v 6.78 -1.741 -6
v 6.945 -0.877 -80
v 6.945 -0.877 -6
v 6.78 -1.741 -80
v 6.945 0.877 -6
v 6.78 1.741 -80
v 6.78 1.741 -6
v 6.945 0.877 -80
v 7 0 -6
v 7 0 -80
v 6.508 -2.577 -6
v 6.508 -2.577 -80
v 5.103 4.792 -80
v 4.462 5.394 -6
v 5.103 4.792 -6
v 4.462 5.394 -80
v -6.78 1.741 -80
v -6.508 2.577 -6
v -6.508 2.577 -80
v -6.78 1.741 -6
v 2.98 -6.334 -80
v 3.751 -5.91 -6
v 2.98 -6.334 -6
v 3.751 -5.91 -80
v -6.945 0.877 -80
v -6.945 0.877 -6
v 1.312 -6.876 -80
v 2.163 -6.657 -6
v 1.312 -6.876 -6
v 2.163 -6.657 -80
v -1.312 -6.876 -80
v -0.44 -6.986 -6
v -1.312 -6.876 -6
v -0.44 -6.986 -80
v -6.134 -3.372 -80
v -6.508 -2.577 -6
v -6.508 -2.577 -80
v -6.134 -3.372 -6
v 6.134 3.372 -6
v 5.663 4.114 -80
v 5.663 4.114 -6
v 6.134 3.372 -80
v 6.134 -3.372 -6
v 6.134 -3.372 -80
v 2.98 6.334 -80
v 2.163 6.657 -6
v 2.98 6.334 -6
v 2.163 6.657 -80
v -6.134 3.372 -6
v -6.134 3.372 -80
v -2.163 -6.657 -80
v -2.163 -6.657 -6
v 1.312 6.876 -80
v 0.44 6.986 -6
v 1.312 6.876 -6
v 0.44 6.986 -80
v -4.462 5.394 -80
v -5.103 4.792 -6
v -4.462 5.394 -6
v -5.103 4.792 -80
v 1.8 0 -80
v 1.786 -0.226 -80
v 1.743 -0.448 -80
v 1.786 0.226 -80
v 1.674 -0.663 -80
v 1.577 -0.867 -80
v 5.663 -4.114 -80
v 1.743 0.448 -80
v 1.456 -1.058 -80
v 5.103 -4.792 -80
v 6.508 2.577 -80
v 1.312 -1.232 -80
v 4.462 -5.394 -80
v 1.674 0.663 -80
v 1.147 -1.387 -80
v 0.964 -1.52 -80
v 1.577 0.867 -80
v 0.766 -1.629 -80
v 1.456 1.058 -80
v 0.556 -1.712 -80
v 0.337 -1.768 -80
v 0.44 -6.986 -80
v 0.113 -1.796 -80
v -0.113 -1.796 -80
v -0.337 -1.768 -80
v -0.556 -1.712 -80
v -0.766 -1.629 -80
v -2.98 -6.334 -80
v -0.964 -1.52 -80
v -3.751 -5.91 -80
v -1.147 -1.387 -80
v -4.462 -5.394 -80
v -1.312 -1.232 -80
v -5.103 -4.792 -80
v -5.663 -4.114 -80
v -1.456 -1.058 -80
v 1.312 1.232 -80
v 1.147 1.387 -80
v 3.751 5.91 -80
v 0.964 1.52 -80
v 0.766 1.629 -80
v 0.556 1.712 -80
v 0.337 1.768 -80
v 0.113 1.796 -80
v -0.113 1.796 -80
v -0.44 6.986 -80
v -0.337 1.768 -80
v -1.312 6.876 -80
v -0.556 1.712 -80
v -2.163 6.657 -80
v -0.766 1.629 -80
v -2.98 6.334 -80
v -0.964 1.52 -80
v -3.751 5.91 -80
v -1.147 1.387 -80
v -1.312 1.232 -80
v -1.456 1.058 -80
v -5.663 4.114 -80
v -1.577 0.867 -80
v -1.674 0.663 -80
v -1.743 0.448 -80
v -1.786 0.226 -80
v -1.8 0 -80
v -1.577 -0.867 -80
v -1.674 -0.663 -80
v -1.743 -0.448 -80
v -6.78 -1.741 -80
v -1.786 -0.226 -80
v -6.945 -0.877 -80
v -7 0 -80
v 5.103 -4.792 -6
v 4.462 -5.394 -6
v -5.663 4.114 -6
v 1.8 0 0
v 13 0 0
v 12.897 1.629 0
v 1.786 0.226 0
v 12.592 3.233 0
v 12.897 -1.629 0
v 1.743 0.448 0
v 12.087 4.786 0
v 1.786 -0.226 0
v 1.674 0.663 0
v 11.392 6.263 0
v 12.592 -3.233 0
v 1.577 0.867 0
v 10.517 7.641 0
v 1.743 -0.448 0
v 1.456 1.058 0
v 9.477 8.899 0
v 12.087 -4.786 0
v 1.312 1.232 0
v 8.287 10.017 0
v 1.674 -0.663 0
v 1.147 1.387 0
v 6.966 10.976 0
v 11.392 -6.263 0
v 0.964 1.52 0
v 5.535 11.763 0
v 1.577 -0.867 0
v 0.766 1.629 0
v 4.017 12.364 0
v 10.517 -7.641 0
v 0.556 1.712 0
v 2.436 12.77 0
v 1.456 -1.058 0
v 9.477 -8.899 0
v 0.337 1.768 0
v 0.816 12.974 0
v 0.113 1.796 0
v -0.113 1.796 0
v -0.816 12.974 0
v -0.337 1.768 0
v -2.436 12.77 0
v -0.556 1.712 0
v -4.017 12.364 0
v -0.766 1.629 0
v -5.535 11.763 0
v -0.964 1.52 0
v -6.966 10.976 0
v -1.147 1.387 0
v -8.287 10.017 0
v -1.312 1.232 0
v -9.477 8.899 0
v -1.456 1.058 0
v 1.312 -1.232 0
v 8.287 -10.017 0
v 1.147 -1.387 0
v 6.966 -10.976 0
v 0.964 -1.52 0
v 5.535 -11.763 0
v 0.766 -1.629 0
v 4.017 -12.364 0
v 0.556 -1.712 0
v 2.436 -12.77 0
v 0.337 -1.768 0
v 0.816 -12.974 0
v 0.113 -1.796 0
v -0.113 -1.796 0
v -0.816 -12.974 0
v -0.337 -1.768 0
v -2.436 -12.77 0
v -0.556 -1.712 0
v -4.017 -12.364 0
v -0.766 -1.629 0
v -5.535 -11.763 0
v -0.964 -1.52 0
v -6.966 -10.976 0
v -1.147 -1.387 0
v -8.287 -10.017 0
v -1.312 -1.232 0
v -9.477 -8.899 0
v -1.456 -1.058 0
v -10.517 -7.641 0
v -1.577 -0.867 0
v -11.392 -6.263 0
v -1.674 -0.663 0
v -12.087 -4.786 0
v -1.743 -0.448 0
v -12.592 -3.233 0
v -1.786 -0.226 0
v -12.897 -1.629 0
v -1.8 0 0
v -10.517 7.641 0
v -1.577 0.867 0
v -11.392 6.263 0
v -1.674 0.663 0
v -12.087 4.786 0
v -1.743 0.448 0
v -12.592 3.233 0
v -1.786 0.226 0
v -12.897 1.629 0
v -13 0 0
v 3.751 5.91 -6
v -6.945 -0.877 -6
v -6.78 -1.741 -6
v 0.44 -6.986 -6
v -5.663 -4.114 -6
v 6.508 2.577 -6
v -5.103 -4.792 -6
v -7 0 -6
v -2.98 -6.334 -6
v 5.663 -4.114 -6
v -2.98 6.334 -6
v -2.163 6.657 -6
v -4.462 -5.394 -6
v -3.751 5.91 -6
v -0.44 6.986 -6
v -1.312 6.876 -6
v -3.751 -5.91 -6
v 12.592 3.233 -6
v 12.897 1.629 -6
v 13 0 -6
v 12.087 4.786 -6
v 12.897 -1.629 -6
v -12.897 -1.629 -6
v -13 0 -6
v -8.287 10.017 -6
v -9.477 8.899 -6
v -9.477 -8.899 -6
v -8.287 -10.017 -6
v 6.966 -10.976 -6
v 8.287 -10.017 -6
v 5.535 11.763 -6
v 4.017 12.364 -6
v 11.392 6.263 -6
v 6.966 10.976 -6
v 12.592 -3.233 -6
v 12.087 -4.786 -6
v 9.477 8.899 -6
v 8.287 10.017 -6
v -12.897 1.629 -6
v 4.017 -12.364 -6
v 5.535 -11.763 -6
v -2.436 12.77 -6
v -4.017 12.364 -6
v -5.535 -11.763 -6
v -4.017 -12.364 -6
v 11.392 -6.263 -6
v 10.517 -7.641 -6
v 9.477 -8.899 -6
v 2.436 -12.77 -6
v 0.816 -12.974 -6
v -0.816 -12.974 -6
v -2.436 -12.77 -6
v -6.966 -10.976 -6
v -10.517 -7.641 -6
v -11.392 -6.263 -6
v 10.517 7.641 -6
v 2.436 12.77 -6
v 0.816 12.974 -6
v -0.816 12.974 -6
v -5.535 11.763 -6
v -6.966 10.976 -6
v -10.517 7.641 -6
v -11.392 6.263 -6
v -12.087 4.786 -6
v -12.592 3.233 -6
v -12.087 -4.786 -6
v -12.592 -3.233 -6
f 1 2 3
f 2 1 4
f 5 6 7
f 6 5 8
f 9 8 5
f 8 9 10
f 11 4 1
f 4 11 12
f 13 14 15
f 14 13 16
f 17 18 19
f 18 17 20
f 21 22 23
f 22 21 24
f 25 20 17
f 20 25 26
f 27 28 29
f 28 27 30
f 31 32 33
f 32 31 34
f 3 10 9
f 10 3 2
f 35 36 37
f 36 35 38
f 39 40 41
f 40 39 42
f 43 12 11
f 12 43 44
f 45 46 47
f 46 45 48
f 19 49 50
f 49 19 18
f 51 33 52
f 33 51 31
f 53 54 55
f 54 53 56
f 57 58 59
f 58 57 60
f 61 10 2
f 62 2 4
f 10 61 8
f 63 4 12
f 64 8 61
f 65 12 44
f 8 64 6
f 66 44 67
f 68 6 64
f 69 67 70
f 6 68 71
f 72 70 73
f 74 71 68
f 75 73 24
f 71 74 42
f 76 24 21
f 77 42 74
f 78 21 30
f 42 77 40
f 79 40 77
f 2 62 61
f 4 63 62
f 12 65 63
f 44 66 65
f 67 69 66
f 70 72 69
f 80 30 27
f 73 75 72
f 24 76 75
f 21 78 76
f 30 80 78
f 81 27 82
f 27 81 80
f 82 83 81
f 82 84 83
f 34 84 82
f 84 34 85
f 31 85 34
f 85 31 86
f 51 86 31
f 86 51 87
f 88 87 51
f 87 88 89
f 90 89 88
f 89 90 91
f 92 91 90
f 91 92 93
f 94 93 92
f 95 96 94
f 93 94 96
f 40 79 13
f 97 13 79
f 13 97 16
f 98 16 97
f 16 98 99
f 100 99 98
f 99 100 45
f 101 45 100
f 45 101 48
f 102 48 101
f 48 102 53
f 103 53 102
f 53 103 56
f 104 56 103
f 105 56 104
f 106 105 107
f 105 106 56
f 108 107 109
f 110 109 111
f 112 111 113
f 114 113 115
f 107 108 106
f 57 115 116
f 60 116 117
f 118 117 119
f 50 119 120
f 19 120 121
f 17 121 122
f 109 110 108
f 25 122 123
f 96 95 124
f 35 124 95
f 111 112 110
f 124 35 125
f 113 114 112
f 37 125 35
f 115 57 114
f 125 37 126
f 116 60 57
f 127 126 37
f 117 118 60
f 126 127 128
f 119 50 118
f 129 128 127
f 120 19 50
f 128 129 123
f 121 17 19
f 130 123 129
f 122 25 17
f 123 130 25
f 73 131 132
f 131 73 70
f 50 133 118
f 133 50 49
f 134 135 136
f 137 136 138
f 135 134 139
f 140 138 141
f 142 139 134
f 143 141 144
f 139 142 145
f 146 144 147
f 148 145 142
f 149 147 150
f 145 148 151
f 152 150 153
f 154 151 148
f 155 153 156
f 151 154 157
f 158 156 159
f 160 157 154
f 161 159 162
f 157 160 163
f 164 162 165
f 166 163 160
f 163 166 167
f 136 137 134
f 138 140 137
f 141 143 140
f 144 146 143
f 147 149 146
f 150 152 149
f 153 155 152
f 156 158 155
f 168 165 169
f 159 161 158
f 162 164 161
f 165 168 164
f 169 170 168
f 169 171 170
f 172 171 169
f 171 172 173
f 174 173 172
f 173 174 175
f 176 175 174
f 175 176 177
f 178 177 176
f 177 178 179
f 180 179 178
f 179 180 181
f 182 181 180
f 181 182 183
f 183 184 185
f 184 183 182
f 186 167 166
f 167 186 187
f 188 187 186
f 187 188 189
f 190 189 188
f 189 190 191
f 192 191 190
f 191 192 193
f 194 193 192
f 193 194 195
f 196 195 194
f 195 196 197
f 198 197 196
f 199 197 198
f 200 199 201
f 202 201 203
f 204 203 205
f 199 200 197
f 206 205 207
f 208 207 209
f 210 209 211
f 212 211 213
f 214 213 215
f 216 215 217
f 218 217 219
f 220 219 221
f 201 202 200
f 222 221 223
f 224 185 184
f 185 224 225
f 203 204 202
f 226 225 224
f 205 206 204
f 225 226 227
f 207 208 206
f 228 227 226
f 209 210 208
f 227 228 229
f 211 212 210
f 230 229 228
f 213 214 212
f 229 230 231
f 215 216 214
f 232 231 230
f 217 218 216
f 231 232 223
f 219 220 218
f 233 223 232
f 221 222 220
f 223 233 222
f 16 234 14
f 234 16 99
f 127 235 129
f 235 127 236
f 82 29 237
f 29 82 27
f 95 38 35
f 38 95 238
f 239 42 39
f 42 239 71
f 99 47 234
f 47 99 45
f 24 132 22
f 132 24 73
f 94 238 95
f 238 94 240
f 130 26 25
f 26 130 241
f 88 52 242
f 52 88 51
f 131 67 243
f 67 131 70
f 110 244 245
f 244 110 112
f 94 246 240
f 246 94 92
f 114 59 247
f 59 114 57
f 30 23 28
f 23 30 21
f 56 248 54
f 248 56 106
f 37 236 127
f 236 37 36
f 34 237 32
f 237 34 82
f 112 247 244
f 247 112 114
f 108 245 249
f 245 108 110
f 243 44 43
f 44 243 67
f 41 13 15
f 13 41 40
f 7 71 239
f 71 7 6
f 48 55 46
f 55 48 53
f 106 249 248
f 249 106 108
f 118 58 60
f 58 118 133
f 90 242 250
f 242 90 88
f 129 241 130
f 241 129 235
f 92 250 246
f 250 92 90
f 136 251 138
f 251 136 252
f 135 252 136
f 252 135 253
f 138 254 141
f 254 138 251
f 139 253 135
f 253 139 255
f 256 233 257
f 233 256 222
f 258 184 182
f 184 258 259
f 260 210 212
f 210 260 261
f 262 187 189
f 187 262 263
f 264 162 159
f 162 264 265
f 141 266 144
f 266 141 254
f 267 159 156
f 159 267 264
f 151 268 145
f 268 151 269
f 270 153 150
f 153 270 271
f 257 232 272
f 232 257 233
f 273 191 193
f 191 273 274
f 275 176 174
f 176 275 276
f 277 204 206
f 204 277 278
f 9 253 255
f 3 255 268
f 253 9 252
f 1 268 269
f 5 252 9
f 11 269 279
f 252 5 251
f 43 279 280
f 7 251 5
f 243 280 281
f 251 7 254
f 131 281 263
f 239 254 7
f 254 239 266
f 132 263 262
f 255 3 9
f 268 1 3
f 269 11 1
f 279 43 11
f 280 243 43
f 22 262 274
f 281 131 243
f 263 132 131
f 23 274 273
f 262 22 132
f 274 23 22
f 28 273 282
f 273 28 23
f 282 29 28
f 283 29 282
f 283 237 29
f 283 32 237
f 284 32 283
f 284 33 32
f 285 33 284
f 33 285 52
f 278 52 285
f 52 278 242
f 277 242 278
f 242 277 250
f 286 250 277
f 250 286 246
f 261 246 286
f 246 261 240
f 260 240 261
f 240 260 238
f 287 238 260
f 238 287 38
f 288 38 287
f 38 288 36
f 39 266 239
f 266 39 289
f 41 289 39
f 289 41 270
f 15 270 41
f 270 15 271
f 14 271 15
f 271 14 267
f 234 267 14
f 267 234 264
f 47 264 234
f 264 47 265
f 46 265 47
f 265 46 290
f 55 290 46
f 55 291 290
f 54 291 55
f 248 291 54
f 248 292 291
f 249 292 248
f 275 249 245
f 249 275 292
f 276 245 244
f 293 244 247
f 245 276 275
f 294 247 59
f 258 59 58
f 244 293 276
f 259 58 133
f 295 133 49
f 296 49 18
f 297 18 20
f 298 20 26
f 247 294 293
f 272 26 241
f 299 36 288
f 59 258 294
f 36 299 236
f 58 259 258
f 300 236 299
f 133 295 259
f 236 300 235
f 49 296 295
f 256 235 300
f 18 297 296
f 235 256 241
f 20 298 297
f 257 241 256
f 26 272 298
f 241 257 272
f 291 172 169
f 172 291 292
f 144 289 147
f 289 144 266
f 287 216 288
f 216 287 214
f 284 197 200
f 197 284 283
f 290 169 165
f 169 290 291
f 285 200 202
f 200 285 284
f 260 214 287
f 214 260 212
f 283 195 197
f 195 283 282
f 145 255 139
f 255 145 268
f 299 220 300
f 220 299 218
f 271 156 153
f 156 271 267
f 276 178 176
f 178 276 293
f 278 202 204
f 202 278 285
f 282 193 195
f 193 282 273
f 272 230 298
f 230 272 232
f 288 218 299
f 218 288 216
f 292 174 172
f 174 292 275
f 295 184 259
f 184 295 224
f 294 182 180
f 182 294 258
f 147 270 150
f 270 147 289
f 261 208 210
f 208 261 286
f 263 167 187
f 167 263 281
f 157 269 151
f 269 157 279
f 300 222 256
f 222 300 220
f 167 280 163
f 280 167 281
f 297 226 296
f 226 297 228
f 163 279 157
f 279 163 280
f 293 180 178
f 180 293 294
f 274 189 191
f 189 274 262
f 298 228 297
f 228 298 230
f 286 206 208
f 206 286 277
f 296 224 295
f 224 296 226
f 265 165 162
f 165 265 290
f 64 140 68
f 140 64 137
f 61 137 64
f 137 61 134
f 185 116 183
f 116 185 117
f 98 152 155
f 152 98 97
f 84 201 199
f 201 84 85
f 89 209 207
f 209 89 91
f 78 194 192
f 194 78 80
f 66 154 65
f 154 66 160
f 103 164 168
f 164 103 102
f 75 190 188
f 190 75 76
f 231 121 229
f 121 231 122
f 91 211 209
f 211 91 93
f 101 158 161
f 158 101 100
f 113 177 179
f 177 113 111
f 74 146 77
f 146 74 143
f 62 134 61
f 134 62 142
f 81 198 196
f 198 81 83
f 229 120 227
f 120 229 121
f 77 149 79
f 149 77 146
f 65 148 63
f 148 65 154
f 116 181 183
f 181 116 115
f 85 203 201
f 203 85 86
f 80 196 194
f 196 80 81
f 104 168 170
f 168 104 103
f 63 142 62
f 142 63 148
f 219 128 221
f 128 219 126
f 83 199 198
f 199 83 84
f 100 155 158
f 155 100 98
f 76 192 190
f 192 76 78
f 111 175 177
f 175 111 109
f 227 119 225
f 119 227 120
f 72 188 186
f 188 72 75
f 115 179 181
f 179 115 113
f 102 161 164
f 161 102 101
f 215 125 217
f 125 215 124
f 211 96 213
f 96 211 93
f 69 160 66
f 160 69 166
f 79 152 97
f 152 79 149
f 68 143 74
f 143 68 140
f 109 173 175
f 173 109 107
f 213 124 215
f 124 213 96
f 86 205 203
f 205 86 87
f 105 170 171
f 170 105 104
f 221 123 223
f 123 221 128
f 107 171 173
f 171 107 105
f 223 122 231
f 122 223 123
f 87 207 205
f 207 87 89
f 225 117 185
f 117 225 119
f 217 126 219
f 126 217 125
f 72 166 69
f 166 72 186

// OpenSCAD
$fn = 50;


difference() {
	union() {
		translate(v = [0, 0, -80.0000000000]) {
			cylinder(h = 80, r = 7.0000000000);
		}
		translate(v = [0, 0, -6.0000000000]) {
			cylinder(h = 6, r = 13.0000000000);
		}
	}
	union() {
		#translate(v = [0, 0, -80]) {
			cylinder(h = 80, r = 1.8000000000);
		}
	}
}
